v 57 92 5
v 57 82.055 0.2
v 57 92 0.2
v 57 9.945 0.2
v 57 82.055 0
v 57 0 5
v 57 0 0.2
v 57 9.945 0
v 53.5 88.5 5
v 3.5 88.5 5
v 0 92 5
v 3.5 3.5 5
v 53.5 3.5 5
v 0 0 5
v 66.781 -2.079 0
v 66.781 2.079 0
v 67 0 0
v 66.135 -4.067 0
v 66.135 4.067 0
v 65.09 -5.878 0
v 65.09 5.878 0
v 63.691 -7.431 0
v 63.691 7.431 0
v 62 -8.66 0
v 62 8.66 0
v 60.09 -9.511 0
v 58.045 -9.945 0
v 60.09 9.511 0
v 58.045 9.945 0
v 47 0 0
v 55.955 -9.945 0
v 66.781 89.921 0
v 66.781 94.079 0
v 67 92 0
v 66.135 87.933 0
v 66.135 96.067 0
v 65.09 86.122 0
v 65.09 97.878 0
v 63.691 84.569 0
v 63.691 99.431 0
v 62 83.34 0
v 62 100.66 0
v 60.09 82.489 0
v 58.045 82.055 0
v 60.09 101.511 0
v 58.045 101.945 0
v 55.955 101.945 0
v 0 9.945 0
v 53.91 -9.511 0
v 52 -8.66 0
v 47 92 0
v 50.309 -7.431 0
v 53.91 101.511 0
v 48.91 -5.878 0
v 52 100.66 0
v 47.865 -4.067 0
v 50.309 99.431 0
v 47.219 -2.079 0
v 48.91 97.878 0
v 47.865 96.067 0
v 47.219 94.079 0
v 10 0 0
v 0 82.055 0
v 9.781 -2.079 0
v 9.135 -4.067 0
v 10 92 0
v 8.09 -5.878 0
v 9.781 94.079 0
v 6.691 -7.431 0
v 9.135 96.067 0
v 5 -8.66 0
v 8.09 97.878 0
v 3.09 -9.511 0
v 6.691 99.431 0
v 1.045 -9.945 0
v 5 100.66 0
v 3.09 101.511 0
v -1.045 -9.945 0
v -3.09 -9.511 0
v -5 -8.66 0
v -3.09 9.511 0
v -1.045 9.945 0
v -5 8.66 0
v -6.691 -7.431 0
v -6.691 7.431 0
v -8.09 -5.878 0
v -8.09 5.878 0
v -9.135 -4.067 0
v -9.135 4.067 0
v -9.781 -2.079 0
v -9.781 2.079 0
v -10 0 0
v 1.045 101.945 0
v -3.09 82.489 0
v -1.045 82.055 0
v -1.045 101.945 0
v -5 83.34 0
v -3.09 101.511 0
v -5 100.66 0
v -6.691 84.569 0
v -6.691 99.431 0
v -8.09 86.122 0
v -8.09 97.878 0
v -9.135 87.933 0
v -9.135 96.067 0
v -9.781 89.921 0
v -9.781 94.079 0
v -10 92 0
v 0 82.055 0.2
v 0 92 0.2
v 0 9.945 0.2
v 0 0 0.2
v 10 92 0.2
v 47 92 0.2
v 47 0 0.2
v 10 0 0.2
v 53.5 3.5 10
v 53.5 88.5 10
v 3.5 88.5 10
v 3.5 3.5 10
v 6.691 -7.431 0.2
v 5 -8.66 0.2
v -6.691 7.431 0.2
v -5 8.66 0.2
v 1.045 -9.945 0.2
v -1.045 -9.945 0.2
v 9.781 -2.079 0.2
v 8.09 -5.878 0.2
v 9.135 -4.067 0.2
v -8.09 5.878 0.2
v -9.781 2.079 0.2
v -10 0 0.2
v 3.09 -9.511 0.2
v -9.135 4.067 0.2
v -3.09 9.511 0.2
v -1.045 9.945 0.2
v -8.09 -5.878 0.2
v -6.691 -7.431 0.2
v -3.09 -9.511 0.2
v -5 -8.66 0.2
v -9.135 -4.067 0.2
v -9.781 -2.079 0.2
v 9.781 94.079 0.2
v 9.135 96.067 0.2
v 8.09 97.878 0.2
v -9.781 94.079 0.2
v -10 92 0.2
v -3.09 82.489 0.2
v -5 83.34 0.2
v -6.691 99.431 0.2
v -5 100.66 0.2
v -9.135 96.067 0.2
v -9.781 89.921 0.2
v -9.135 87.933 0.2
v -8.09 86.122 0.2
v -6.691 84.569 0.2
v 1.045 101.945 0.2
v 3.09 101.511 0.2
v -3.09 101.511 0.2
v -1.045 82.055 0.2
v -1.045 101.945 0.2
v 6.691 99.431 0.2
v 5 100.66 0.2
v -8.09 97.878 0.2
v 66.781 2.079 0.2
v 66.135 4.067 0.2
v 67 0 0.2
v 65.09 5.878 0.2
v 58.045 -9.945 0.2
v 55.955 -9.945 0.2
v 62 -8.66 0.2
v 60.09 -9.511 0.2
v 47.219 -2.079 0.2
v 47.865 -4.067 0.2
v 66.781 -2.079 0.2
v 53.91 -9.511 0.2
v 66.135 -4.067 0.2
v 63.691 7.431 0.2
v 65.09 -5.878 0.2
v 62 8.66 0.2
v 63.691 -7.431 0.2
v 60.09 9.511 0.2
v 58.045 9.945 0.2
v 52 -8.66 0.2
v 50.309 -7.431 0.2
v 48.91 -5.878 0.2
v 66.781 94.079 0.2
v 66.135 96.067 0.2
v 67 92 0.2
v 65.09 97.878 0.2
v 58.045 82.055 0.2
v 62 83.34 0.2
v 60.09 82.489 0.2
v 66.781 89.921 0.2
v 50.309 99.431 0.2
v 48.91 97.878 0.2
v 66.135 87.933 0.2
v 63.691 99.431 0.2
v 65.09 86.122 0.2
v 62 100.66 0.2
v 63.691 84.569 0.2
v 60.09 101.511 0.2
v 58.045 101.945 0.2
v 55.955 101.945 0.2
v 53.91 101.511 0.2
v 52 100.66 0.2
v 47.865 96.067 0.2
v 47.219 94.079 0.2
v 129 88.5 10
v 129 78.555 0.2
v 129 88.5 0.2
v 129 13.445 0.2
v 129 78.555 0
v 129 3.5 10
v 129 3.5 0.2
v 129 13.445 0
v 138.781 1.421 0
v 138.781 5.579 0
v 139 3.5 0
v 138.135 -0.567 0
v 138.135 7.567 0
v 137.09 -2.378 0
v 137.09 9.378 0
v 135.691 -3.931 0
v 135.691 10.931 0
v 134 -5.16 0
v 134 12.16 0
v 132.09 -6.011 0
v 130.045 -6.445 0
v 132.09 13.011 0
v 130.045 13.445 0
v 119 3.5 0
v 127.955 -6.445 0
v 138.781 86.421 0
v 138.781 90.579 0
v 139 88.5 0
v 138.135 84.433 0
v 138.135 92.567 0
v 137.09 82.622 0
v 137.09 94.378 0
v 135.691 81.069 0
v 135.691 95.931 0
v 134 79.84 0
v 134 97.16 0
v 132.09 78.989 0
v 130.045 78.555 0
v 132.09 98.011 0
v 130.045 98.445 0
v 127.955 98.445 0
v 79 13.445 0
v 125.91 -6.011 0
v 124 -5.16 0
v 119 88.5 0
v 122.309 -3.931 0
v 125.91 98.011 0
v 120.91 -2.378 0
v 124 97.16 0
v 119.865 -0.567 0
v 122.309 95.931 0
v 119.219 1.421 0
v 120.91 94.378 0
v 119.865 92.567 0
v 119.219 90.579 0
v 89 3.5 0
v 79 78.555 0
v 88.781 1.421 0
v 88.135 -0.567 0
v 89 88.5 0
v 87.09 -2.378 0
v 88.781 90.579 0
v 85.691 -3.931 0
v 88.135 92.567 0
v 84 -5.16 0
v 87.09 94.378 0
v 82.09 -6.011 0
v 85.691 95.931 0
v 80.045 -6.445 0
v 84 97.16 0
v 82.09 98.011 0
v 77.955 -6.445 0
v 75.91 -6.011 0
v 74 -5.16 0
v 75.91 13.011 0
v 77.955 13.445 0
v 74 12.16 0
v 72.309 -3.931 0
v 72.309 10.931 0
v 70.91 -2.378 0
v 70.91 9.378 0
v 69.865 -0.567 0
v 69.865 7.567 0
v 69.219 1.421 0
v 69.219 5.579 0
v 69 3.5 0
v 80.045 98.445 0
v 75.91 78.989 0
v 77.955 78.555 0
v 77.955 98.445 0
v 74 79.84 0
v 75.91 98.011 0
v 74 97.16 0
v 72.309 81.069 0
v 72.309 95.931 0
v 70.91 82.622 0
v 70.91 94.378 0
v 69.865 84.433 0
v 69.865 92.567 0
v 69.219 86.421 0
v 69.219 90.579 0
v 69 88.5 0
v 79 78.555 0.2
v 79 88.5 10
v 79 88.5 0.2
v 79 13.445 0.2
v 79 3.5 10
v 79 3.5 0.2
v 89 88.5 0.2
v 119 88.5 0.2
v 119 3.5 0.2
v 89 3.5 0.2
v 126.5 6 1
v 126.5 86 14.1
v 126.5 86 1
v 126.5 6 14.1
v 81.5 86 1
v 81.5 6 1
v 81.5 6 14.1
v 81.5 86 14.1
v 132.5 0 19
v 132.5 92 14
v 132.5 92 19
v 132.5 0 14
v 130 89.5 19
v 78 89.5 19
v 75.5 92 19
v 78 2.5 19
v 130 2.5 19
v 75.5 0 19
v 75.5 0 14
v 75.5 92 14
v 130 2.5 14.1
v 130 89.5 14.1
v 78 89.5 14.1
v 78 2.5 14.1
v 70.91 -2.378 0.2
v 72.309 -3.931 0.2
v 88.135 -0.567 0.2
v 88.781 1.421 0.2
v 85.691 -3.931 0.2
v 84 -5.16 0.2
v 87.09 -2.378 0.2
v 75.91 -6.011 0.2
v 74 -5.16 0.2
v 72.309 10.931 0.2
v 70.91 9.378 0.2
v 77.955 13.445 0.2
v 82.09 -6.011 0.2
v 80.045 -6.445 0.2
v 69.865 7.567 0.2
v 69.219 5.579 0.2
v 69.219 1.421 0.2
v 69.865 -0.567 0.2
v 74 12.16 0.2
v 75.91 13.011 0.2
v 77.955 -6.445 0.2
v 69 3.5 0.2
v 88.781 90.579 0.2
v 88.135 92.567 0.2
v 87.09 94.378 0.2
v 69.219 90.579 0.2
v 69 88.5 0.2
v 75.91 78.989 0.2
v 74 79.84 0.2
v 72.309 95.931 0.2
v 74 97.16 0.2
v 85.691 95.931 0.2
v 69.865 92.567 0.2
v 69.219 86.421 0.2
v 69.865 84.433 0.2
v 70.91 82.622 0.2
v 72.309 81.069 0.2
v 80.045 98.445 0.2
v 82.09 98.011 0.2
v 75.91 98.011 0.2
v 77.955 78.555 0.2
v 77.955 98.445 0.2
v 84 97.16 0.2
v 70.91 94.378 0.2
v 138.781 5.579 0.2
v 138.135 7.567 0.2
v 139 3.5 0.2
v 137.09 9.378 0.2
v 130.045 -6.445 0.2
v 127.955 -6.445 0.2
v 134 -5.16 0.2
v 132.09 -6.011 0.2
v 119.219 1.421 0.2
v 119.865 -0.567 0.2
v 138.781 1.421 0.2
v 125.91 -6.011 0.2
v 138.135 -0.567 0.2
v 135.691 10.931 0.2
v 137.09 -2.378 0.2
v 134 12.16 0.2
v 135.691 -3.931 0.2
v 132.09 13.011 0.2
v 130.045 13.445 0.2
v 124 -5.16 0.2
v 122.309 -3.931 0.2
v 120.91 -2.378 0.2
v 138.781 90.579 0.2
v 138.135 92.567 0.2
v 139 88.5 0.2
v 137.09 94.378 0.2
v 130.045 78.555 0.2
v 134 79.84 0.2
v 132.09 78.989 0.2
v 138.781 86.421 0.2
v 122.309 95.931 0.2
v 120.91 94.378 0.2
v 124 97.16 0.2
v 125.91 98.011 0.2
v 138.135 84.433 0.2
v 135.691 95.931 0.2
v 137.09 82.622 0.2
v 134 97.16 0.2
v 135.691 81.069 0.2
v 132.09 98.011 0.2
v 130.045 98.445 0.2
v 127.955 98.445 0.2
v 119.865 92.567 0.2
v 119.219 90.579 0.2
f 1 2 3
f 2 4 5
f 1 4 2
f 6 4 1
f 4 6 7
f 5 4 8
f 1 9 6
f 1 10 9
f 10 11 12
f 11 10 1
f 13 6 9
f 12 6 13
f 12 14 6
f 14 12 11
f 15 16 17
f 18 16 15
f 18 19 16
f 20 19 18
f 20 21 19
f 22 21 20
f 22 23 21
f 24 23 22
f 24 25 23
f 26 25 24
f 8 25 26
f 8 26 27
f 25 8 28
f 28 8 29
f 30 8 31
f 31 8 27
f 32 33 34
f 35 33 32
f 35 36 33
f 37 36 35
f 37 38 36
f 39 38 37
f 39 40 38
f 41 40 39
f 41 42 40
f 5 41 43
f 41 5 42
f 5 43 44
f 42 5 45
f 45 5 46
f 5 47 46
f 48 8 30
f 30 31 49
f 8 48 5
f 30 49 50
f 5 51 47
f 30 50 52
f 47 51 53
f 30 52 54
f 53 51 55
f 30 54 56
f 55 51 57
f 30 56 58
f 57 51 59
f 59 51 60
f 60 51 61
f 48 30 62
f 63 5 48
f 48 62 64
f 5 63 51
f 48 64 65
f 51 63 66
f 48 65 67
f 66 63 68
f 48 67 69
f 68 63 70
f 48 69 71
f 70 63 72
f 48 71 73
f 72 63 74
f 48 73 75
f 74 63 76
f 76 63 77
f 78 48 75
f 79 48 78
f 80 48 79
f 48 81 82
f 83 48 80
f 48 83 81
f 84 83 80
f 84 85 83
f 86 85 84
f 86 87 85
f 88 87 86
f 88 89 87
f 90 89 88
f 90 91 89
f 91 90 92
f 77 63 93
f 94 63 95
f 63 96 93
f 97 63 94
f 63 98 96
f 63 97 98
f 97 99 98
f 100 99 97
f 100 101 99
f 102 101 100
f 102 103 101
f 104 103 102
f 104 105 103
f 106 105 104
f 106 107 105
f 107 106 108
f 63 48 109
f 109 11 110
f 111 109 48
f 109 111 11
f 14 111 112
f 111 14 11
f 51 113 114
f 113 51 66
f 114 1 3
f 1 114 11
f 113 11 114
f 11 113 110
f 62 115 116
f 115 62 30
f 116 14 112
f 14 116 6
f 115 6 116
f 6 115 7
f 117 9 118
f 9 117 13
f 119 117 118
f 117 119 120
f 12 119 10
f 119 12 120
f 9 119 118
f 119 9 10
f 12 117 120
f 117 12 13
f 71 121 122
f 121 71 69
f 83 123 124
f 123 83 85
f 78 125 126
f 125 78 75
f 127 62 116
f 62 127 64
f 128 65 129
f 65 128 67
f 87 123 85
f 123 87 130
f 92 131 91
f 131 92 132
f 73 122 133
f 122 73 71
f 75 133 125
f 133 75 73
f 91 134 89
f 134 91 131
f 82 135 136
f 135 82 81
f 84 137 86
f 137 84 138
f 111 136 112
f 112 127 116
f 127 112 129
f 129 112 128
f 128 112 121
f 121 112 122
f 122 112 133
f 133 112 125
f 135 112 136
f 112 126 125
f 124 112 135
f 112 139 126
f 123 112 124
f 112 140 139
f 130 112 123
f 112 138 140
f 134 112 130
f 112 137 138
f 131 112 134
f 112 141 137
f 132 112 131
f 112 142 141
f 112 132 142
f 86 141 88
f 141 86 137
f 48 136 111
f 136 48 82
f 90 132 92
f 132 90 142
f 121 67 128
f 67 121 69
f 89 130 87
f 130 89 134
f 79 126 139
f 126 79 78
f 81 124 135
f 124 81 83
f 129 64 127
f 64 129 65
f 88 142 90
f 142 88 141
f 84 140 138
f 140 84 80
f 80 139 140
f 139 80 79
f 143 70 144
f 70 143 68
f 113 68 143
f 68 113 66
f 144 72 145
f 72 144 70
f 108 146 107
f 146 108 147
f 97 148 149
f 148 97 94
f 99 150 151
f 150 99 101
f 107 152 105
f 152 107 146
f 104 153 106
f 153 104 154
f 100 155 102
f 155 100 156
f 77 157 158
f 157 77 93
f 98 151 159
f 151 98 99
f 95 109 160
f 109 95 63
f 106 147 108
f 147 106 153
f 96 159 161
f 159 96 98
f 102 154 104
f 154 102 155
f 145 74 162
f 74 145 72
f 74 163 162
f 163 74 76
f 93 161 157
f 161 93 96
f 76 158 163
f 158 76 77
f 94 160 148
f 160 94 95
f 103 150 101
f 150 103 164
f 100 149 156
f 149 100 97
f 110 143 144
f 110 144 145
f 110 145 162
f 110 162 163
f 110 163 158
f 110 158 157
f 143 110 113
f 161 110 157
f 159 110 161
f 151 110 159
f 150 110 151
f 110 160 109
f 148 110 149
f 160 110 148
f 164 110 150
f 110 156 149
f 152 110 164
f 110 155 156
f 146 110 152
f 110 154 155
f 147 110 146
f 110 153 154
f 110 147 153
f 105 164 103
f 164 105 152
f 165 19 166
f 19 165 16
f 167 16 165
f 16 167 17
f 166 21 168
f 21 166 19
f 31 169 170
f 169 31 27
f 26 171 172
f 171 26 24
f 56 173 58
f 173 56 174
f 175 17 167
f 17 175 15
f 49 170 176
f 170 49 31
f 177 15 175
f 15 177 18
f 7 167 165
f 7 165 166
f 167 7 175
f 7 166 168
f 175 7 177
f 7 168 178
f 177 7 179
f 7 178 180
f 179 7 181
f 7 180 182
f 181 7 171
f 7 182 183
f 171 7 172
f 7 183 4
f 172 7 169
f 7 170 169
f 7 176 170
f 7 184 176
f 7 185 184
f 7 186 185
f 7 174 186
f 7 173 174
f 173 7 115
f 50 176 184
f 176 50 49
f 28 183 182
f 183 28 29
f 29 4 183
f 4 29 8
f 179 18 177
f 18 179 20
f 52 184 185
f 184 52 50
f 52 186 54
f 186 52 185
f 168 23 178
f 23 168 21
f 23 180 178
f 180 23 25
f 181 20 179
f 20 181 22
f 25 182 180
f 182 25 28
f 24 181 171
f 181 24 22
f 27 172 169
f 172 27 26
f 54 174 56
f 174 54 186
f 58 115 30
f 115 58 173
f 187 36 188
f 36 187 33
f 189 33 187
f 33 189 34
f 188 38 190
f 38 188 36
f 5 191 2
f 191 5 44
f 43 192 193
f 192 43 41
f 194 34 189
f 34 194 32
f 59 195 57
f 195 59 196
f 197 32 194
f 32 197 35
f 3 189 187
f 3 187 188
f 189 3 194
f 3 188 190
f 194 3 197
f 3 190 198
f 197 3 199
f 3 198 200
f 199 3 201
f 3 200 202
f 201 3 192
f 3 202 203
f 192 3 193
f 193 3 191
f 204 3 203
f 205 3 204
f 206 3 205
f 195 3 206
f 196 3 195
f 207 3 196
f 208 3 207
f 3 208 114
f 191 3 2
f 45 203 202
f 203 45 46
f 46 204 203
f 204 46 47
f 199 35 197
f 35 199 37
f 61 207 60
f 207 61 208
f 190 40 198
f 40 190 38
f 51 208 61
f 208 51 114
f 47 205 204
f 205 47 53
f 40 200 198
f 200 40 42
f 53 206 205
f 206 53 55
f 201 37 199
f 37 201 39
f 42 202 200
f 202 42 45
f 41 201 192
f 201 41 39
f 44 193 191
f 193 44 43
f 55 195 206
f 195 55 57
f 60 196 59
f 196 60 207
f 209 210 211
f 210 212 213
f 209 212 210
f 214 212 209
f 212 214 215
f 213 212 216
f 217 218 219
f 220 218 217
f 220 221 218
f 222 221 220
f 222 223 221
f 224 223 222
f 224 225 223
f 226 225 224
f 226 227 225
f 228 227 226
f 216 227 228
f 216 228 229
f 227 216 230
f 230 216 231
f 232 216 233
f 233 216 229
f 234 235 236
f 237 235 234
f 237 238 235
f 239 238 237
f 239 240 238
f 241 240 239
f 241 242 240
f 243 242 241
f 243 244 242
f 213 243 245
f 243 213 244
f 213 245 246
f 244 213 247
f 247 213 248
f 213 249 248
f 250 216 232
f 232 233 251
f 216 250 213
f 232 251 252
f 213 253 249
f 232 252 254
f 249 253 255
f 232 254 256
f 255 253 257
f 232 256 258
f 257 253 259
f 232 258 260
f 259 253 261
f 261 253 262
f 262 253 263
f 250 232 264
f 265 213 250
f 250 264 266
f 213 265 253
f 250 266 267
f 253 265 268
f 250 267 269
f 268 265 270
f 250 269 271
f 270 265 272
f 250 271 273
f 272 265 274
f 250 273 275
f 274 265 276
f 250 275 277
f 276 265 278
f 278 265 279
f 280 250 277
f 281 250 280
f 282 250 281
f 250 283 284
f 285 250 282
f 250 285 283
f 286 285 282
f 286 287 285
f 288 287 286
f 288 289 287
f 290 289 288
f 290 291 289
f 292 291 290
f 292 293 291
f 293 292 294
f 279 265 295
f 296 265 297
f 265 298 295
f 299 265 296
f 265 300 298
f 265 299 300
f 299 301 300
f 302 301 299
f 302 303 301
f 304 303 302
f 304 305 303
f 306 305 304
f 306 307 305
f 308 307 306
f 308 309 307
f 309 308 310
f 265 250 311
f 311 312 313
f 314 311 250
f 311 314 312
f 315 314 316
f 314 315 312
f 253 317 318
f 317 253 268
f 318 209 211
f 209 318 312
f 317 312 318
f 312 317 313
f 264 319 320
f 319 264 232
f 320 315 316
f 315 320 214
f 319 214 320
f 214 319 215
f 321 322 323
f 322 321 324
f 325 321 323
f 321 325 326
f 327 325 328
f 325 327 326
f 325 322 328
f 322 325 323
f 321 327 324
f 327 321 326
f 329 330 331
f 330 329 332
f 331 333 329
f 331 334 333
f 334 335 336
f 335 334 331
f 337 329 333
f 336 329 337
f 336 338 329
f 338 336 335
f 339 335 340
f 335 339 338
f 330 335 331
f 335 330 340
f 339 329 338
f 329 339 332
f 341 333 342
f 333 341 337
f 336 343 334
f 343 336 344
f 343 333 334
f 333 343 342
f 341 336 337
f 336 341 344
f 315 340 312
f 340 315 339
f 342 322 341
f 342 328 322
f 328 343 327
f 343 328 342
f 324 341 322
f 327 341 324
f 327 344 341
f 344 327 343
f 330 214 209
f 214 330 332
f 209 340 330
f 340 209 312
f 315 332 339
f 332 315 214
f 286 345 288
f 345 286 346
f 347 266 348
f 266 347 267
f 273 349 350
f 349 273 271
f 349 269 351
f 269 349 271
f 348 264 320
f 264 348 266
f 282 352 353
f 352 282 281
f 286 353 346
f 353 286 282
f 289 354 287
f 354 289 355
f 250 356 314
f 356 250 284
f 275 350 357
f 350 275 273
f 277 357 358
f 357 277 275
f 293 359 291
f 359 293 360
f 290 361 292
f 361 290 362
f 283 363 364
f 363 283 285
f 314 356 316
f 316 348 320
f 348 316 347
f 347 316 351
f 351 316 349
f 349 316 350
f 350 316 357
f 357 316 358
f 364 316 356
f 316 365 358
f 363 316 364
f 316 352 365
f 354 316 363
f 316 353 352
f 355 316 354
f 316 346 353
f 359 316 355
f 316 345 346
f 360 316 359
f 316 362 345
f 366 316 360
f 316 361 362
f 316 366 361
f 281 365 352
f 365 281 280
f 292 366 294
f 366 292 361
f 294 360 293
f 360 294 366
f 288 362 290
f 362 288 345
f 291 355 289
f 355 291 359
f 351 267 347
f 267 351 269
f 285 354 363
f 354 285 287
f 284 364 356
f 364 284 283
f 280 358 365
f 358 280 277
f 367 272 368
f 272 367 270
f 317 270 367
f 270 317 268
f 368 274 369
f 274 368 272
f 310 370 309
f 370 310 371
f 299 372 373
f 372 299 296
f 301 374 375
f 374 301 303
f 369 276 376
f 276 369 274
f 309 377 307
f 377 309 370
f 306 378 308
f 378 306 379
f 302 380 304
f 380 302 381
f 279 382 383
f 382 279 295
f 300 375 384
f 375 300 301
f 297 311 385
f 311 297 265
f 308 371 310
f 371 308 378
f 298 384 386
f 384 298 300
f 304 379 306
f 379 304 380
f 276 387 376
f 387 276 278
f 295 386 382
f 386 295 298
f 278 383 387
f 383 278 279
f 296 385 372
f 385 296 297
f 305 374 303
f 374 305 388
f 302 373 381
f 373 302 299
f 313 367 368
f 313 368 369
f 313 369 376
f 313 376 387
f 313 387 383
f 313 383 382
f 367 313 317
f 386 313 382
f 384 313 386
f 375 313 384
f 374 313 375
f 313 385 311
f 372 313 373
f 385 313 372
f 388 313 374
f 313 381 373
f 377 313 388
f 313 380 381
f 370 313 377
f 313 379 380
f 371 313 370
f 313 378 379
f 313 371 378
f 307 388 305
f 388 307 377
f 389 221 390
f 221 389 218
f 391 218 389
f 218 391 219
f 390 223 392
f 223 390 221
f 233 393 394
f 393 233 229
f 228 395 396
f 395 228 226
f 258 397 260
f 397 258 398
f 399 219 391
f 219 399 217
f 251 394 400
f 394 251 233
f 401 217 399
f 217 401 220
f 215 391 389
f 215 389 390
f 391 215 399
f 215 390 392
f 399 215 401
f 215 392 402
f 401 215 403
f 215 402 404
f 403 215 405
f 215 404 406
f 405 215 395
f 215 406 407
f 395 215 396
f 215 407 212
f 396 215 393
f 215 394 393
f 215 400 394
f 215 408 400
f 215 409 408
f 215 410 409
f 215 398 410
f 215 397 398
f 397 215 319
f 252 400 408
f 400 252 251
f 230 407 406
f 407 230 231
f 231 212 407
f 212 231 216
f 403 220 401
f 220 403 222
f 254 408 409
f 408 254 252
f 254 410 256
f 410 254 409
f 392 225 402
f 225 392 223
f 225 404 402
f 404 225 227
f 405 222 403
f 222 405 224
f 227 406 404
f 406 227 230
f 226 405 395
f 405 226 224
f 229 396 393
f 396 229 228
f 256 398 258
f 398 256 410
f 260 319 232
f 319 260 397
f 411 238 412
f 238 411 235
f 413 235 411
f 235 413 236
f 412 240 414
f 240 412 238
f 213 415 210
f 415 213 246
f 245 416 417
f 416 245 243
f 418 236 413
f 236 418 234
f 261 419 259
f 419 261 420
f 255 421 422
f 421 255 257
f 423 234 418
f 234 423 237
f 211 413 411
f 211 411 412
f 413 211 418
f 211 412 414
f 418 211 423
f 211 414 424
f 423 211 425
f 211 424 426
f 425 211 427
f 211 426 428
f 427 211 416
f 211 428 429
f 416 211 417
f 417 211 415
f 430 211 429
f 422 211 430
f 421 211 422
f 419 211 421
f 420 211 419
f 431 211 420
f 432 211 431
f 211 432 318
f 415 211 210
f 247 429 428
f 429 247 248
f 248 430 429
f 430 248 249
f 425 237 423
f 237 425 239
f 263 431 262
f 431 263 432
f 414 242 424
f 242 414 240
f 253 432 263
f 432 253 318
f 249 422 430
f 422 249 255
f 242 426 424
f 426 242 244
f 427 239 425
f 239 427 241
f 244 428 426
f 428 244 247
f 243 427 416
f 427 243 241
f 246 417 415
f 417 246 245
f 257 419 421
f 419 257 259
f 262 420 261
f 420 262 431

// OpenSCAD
// Display the Cover
display_cover = "yes"; // [yes,no]
// Display the box
display_box = "yes"; // [yes,no]
// Create ears at the corner
with_antiwarp_ears = "yes"; // [yes,no]


// the x length inside the box (the resulting x of the box is inner_x + 2*wall)
inner_x = 45;
// the y length inside the box
inner_y = 80;
// the z height inside the box, until the stacking frame begins
inner_z = 13;

// the z height of the stacking frame
stack_z = 5;
// per side gap between the box-bottom and the stacking frame (box bttom = inner_x + 2*wall; inner stackingframe x = inner_x + 2*wall + 2*stack_gap)
stack_gap = 1;

// wall thickness
wall = 2.5;
// bottom thickness
bottom = 1;

// start-height for overhang suport (should be >stack_z )
support_start_height = 10;

// height of the cover (the stacking part has the "stack_z"-height)
cover_height = 5;

// radius of the antiwarp ear
ear_radius = 10;
// height of the antiwarp ear, should be your layer-height for easy cutoff
ear_height = 0.2;


if(display_cover == "yes"){
	stackable_box_cover(inner_x,inner_y,stack_z,stack_gap,wall,cover_height);
	if(with_antiwarp_ears == "yes"){
		ears(0, 0, inner_x + wall*4 + stack_gap*2, inner_y + wall*4 + stack_gap*2);
	}
}


if(display_box == "yes"){
translate([inner_x + wall*4 + stack_gap*2 + ear_radius*2 + 2,wall + stack_gap,0]){
	stackable_box(inner_x,inner_y,inner_z,stack_z,stack_gap,wall,bottom,support_start_height);
	if(with_antiwarp_ears == "yes"){
		difference() {
			ears(0, 0, inner_x + wall*2, inner_y + wall*2);
			translate([wall,wall, 0]) 
				cube([inner_x, inner_y, inner_z*2]);
		}
	}
}
}


module stackable_box_cover(x, y,stack_z, gap, w,c) {
	cube([x + w*4 + gap*2, y + w*4 + gap*2, c]);
	translate([w+gap, w+gap, 0])
		cube([x + w*2, y + w*2, stack_z+c]);


}


module stackable_box(x, y, z,stack_z, gap, w, b, supheight) {
	box(x, y, z, w, b);
	translate([-wall-gap, -wall-gap, z+b])
		box(x + wall*2 + gap*2, y + wall*2 + gap*2, stack_z, w, 0);

	difference() {
		hull() {
			translate([-wall-gap, -wall-gap, z+b]) 
				box(x + wall*2 + gap*2, y + wall*2 + gap*2, 0.1, w, 0);
			translate([0, 0, supheight]) 
				box(x, y, 0.1, w, b);
		}
		translate([w,w, 0]) 
			cube([x, y, z*2]);
	}


}

module box(x, y, z, w,b) {
	difference() {
		cube([(x + (2 * w)), (y + (2 * w)), (z + b)]);
		translate([w, w, b]) 
			cube([x, y, (z * 2)]);
	}
}

module ears(xmin, ymin, xmax, ymax) {
	translate([xmin, ymin, 0]) cylinder(r = ear_radius, h = ear_height);
	translate([xmin, ymax, 0]) cylinder(r = ear_radius, h = ear_height);
	translate([xmax, ymin, 0]) cylinder(r = ear_radius, h = ear_height);
	translate([xmax, ymax, 0]) cylinder(r = ear_radius, h = ear_height);
}
